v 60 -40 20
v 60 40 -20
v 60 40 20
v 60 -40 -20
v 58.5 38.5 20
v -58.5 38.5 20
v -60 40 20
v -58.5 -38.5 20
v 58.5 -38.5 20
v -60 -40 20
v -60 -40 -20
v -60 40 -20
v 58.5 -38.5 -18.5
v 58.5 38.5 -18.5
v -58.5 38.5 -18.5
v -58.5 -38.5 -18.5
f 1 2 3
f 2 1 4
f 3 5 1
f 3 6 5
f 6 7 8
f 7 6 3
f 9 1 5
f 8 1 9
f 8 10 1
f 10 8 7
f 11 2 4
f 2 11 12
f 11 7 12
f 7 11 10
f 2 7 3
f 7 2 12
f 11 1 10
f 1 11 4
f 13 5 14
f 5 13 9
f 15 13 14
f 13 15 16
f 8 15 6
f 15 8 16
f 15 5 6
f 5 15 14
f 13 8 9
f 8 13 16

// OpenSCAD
$fn=100;
eps=1/128;

bw=120;
bd=80;
bh=40;
wt=1.5;

difference() {
    cube([bw,bd,bh], center=true);
    translate([0,0,wt]) cube([bw-wt*2,bd-wt*2,bh], center=true);
}
